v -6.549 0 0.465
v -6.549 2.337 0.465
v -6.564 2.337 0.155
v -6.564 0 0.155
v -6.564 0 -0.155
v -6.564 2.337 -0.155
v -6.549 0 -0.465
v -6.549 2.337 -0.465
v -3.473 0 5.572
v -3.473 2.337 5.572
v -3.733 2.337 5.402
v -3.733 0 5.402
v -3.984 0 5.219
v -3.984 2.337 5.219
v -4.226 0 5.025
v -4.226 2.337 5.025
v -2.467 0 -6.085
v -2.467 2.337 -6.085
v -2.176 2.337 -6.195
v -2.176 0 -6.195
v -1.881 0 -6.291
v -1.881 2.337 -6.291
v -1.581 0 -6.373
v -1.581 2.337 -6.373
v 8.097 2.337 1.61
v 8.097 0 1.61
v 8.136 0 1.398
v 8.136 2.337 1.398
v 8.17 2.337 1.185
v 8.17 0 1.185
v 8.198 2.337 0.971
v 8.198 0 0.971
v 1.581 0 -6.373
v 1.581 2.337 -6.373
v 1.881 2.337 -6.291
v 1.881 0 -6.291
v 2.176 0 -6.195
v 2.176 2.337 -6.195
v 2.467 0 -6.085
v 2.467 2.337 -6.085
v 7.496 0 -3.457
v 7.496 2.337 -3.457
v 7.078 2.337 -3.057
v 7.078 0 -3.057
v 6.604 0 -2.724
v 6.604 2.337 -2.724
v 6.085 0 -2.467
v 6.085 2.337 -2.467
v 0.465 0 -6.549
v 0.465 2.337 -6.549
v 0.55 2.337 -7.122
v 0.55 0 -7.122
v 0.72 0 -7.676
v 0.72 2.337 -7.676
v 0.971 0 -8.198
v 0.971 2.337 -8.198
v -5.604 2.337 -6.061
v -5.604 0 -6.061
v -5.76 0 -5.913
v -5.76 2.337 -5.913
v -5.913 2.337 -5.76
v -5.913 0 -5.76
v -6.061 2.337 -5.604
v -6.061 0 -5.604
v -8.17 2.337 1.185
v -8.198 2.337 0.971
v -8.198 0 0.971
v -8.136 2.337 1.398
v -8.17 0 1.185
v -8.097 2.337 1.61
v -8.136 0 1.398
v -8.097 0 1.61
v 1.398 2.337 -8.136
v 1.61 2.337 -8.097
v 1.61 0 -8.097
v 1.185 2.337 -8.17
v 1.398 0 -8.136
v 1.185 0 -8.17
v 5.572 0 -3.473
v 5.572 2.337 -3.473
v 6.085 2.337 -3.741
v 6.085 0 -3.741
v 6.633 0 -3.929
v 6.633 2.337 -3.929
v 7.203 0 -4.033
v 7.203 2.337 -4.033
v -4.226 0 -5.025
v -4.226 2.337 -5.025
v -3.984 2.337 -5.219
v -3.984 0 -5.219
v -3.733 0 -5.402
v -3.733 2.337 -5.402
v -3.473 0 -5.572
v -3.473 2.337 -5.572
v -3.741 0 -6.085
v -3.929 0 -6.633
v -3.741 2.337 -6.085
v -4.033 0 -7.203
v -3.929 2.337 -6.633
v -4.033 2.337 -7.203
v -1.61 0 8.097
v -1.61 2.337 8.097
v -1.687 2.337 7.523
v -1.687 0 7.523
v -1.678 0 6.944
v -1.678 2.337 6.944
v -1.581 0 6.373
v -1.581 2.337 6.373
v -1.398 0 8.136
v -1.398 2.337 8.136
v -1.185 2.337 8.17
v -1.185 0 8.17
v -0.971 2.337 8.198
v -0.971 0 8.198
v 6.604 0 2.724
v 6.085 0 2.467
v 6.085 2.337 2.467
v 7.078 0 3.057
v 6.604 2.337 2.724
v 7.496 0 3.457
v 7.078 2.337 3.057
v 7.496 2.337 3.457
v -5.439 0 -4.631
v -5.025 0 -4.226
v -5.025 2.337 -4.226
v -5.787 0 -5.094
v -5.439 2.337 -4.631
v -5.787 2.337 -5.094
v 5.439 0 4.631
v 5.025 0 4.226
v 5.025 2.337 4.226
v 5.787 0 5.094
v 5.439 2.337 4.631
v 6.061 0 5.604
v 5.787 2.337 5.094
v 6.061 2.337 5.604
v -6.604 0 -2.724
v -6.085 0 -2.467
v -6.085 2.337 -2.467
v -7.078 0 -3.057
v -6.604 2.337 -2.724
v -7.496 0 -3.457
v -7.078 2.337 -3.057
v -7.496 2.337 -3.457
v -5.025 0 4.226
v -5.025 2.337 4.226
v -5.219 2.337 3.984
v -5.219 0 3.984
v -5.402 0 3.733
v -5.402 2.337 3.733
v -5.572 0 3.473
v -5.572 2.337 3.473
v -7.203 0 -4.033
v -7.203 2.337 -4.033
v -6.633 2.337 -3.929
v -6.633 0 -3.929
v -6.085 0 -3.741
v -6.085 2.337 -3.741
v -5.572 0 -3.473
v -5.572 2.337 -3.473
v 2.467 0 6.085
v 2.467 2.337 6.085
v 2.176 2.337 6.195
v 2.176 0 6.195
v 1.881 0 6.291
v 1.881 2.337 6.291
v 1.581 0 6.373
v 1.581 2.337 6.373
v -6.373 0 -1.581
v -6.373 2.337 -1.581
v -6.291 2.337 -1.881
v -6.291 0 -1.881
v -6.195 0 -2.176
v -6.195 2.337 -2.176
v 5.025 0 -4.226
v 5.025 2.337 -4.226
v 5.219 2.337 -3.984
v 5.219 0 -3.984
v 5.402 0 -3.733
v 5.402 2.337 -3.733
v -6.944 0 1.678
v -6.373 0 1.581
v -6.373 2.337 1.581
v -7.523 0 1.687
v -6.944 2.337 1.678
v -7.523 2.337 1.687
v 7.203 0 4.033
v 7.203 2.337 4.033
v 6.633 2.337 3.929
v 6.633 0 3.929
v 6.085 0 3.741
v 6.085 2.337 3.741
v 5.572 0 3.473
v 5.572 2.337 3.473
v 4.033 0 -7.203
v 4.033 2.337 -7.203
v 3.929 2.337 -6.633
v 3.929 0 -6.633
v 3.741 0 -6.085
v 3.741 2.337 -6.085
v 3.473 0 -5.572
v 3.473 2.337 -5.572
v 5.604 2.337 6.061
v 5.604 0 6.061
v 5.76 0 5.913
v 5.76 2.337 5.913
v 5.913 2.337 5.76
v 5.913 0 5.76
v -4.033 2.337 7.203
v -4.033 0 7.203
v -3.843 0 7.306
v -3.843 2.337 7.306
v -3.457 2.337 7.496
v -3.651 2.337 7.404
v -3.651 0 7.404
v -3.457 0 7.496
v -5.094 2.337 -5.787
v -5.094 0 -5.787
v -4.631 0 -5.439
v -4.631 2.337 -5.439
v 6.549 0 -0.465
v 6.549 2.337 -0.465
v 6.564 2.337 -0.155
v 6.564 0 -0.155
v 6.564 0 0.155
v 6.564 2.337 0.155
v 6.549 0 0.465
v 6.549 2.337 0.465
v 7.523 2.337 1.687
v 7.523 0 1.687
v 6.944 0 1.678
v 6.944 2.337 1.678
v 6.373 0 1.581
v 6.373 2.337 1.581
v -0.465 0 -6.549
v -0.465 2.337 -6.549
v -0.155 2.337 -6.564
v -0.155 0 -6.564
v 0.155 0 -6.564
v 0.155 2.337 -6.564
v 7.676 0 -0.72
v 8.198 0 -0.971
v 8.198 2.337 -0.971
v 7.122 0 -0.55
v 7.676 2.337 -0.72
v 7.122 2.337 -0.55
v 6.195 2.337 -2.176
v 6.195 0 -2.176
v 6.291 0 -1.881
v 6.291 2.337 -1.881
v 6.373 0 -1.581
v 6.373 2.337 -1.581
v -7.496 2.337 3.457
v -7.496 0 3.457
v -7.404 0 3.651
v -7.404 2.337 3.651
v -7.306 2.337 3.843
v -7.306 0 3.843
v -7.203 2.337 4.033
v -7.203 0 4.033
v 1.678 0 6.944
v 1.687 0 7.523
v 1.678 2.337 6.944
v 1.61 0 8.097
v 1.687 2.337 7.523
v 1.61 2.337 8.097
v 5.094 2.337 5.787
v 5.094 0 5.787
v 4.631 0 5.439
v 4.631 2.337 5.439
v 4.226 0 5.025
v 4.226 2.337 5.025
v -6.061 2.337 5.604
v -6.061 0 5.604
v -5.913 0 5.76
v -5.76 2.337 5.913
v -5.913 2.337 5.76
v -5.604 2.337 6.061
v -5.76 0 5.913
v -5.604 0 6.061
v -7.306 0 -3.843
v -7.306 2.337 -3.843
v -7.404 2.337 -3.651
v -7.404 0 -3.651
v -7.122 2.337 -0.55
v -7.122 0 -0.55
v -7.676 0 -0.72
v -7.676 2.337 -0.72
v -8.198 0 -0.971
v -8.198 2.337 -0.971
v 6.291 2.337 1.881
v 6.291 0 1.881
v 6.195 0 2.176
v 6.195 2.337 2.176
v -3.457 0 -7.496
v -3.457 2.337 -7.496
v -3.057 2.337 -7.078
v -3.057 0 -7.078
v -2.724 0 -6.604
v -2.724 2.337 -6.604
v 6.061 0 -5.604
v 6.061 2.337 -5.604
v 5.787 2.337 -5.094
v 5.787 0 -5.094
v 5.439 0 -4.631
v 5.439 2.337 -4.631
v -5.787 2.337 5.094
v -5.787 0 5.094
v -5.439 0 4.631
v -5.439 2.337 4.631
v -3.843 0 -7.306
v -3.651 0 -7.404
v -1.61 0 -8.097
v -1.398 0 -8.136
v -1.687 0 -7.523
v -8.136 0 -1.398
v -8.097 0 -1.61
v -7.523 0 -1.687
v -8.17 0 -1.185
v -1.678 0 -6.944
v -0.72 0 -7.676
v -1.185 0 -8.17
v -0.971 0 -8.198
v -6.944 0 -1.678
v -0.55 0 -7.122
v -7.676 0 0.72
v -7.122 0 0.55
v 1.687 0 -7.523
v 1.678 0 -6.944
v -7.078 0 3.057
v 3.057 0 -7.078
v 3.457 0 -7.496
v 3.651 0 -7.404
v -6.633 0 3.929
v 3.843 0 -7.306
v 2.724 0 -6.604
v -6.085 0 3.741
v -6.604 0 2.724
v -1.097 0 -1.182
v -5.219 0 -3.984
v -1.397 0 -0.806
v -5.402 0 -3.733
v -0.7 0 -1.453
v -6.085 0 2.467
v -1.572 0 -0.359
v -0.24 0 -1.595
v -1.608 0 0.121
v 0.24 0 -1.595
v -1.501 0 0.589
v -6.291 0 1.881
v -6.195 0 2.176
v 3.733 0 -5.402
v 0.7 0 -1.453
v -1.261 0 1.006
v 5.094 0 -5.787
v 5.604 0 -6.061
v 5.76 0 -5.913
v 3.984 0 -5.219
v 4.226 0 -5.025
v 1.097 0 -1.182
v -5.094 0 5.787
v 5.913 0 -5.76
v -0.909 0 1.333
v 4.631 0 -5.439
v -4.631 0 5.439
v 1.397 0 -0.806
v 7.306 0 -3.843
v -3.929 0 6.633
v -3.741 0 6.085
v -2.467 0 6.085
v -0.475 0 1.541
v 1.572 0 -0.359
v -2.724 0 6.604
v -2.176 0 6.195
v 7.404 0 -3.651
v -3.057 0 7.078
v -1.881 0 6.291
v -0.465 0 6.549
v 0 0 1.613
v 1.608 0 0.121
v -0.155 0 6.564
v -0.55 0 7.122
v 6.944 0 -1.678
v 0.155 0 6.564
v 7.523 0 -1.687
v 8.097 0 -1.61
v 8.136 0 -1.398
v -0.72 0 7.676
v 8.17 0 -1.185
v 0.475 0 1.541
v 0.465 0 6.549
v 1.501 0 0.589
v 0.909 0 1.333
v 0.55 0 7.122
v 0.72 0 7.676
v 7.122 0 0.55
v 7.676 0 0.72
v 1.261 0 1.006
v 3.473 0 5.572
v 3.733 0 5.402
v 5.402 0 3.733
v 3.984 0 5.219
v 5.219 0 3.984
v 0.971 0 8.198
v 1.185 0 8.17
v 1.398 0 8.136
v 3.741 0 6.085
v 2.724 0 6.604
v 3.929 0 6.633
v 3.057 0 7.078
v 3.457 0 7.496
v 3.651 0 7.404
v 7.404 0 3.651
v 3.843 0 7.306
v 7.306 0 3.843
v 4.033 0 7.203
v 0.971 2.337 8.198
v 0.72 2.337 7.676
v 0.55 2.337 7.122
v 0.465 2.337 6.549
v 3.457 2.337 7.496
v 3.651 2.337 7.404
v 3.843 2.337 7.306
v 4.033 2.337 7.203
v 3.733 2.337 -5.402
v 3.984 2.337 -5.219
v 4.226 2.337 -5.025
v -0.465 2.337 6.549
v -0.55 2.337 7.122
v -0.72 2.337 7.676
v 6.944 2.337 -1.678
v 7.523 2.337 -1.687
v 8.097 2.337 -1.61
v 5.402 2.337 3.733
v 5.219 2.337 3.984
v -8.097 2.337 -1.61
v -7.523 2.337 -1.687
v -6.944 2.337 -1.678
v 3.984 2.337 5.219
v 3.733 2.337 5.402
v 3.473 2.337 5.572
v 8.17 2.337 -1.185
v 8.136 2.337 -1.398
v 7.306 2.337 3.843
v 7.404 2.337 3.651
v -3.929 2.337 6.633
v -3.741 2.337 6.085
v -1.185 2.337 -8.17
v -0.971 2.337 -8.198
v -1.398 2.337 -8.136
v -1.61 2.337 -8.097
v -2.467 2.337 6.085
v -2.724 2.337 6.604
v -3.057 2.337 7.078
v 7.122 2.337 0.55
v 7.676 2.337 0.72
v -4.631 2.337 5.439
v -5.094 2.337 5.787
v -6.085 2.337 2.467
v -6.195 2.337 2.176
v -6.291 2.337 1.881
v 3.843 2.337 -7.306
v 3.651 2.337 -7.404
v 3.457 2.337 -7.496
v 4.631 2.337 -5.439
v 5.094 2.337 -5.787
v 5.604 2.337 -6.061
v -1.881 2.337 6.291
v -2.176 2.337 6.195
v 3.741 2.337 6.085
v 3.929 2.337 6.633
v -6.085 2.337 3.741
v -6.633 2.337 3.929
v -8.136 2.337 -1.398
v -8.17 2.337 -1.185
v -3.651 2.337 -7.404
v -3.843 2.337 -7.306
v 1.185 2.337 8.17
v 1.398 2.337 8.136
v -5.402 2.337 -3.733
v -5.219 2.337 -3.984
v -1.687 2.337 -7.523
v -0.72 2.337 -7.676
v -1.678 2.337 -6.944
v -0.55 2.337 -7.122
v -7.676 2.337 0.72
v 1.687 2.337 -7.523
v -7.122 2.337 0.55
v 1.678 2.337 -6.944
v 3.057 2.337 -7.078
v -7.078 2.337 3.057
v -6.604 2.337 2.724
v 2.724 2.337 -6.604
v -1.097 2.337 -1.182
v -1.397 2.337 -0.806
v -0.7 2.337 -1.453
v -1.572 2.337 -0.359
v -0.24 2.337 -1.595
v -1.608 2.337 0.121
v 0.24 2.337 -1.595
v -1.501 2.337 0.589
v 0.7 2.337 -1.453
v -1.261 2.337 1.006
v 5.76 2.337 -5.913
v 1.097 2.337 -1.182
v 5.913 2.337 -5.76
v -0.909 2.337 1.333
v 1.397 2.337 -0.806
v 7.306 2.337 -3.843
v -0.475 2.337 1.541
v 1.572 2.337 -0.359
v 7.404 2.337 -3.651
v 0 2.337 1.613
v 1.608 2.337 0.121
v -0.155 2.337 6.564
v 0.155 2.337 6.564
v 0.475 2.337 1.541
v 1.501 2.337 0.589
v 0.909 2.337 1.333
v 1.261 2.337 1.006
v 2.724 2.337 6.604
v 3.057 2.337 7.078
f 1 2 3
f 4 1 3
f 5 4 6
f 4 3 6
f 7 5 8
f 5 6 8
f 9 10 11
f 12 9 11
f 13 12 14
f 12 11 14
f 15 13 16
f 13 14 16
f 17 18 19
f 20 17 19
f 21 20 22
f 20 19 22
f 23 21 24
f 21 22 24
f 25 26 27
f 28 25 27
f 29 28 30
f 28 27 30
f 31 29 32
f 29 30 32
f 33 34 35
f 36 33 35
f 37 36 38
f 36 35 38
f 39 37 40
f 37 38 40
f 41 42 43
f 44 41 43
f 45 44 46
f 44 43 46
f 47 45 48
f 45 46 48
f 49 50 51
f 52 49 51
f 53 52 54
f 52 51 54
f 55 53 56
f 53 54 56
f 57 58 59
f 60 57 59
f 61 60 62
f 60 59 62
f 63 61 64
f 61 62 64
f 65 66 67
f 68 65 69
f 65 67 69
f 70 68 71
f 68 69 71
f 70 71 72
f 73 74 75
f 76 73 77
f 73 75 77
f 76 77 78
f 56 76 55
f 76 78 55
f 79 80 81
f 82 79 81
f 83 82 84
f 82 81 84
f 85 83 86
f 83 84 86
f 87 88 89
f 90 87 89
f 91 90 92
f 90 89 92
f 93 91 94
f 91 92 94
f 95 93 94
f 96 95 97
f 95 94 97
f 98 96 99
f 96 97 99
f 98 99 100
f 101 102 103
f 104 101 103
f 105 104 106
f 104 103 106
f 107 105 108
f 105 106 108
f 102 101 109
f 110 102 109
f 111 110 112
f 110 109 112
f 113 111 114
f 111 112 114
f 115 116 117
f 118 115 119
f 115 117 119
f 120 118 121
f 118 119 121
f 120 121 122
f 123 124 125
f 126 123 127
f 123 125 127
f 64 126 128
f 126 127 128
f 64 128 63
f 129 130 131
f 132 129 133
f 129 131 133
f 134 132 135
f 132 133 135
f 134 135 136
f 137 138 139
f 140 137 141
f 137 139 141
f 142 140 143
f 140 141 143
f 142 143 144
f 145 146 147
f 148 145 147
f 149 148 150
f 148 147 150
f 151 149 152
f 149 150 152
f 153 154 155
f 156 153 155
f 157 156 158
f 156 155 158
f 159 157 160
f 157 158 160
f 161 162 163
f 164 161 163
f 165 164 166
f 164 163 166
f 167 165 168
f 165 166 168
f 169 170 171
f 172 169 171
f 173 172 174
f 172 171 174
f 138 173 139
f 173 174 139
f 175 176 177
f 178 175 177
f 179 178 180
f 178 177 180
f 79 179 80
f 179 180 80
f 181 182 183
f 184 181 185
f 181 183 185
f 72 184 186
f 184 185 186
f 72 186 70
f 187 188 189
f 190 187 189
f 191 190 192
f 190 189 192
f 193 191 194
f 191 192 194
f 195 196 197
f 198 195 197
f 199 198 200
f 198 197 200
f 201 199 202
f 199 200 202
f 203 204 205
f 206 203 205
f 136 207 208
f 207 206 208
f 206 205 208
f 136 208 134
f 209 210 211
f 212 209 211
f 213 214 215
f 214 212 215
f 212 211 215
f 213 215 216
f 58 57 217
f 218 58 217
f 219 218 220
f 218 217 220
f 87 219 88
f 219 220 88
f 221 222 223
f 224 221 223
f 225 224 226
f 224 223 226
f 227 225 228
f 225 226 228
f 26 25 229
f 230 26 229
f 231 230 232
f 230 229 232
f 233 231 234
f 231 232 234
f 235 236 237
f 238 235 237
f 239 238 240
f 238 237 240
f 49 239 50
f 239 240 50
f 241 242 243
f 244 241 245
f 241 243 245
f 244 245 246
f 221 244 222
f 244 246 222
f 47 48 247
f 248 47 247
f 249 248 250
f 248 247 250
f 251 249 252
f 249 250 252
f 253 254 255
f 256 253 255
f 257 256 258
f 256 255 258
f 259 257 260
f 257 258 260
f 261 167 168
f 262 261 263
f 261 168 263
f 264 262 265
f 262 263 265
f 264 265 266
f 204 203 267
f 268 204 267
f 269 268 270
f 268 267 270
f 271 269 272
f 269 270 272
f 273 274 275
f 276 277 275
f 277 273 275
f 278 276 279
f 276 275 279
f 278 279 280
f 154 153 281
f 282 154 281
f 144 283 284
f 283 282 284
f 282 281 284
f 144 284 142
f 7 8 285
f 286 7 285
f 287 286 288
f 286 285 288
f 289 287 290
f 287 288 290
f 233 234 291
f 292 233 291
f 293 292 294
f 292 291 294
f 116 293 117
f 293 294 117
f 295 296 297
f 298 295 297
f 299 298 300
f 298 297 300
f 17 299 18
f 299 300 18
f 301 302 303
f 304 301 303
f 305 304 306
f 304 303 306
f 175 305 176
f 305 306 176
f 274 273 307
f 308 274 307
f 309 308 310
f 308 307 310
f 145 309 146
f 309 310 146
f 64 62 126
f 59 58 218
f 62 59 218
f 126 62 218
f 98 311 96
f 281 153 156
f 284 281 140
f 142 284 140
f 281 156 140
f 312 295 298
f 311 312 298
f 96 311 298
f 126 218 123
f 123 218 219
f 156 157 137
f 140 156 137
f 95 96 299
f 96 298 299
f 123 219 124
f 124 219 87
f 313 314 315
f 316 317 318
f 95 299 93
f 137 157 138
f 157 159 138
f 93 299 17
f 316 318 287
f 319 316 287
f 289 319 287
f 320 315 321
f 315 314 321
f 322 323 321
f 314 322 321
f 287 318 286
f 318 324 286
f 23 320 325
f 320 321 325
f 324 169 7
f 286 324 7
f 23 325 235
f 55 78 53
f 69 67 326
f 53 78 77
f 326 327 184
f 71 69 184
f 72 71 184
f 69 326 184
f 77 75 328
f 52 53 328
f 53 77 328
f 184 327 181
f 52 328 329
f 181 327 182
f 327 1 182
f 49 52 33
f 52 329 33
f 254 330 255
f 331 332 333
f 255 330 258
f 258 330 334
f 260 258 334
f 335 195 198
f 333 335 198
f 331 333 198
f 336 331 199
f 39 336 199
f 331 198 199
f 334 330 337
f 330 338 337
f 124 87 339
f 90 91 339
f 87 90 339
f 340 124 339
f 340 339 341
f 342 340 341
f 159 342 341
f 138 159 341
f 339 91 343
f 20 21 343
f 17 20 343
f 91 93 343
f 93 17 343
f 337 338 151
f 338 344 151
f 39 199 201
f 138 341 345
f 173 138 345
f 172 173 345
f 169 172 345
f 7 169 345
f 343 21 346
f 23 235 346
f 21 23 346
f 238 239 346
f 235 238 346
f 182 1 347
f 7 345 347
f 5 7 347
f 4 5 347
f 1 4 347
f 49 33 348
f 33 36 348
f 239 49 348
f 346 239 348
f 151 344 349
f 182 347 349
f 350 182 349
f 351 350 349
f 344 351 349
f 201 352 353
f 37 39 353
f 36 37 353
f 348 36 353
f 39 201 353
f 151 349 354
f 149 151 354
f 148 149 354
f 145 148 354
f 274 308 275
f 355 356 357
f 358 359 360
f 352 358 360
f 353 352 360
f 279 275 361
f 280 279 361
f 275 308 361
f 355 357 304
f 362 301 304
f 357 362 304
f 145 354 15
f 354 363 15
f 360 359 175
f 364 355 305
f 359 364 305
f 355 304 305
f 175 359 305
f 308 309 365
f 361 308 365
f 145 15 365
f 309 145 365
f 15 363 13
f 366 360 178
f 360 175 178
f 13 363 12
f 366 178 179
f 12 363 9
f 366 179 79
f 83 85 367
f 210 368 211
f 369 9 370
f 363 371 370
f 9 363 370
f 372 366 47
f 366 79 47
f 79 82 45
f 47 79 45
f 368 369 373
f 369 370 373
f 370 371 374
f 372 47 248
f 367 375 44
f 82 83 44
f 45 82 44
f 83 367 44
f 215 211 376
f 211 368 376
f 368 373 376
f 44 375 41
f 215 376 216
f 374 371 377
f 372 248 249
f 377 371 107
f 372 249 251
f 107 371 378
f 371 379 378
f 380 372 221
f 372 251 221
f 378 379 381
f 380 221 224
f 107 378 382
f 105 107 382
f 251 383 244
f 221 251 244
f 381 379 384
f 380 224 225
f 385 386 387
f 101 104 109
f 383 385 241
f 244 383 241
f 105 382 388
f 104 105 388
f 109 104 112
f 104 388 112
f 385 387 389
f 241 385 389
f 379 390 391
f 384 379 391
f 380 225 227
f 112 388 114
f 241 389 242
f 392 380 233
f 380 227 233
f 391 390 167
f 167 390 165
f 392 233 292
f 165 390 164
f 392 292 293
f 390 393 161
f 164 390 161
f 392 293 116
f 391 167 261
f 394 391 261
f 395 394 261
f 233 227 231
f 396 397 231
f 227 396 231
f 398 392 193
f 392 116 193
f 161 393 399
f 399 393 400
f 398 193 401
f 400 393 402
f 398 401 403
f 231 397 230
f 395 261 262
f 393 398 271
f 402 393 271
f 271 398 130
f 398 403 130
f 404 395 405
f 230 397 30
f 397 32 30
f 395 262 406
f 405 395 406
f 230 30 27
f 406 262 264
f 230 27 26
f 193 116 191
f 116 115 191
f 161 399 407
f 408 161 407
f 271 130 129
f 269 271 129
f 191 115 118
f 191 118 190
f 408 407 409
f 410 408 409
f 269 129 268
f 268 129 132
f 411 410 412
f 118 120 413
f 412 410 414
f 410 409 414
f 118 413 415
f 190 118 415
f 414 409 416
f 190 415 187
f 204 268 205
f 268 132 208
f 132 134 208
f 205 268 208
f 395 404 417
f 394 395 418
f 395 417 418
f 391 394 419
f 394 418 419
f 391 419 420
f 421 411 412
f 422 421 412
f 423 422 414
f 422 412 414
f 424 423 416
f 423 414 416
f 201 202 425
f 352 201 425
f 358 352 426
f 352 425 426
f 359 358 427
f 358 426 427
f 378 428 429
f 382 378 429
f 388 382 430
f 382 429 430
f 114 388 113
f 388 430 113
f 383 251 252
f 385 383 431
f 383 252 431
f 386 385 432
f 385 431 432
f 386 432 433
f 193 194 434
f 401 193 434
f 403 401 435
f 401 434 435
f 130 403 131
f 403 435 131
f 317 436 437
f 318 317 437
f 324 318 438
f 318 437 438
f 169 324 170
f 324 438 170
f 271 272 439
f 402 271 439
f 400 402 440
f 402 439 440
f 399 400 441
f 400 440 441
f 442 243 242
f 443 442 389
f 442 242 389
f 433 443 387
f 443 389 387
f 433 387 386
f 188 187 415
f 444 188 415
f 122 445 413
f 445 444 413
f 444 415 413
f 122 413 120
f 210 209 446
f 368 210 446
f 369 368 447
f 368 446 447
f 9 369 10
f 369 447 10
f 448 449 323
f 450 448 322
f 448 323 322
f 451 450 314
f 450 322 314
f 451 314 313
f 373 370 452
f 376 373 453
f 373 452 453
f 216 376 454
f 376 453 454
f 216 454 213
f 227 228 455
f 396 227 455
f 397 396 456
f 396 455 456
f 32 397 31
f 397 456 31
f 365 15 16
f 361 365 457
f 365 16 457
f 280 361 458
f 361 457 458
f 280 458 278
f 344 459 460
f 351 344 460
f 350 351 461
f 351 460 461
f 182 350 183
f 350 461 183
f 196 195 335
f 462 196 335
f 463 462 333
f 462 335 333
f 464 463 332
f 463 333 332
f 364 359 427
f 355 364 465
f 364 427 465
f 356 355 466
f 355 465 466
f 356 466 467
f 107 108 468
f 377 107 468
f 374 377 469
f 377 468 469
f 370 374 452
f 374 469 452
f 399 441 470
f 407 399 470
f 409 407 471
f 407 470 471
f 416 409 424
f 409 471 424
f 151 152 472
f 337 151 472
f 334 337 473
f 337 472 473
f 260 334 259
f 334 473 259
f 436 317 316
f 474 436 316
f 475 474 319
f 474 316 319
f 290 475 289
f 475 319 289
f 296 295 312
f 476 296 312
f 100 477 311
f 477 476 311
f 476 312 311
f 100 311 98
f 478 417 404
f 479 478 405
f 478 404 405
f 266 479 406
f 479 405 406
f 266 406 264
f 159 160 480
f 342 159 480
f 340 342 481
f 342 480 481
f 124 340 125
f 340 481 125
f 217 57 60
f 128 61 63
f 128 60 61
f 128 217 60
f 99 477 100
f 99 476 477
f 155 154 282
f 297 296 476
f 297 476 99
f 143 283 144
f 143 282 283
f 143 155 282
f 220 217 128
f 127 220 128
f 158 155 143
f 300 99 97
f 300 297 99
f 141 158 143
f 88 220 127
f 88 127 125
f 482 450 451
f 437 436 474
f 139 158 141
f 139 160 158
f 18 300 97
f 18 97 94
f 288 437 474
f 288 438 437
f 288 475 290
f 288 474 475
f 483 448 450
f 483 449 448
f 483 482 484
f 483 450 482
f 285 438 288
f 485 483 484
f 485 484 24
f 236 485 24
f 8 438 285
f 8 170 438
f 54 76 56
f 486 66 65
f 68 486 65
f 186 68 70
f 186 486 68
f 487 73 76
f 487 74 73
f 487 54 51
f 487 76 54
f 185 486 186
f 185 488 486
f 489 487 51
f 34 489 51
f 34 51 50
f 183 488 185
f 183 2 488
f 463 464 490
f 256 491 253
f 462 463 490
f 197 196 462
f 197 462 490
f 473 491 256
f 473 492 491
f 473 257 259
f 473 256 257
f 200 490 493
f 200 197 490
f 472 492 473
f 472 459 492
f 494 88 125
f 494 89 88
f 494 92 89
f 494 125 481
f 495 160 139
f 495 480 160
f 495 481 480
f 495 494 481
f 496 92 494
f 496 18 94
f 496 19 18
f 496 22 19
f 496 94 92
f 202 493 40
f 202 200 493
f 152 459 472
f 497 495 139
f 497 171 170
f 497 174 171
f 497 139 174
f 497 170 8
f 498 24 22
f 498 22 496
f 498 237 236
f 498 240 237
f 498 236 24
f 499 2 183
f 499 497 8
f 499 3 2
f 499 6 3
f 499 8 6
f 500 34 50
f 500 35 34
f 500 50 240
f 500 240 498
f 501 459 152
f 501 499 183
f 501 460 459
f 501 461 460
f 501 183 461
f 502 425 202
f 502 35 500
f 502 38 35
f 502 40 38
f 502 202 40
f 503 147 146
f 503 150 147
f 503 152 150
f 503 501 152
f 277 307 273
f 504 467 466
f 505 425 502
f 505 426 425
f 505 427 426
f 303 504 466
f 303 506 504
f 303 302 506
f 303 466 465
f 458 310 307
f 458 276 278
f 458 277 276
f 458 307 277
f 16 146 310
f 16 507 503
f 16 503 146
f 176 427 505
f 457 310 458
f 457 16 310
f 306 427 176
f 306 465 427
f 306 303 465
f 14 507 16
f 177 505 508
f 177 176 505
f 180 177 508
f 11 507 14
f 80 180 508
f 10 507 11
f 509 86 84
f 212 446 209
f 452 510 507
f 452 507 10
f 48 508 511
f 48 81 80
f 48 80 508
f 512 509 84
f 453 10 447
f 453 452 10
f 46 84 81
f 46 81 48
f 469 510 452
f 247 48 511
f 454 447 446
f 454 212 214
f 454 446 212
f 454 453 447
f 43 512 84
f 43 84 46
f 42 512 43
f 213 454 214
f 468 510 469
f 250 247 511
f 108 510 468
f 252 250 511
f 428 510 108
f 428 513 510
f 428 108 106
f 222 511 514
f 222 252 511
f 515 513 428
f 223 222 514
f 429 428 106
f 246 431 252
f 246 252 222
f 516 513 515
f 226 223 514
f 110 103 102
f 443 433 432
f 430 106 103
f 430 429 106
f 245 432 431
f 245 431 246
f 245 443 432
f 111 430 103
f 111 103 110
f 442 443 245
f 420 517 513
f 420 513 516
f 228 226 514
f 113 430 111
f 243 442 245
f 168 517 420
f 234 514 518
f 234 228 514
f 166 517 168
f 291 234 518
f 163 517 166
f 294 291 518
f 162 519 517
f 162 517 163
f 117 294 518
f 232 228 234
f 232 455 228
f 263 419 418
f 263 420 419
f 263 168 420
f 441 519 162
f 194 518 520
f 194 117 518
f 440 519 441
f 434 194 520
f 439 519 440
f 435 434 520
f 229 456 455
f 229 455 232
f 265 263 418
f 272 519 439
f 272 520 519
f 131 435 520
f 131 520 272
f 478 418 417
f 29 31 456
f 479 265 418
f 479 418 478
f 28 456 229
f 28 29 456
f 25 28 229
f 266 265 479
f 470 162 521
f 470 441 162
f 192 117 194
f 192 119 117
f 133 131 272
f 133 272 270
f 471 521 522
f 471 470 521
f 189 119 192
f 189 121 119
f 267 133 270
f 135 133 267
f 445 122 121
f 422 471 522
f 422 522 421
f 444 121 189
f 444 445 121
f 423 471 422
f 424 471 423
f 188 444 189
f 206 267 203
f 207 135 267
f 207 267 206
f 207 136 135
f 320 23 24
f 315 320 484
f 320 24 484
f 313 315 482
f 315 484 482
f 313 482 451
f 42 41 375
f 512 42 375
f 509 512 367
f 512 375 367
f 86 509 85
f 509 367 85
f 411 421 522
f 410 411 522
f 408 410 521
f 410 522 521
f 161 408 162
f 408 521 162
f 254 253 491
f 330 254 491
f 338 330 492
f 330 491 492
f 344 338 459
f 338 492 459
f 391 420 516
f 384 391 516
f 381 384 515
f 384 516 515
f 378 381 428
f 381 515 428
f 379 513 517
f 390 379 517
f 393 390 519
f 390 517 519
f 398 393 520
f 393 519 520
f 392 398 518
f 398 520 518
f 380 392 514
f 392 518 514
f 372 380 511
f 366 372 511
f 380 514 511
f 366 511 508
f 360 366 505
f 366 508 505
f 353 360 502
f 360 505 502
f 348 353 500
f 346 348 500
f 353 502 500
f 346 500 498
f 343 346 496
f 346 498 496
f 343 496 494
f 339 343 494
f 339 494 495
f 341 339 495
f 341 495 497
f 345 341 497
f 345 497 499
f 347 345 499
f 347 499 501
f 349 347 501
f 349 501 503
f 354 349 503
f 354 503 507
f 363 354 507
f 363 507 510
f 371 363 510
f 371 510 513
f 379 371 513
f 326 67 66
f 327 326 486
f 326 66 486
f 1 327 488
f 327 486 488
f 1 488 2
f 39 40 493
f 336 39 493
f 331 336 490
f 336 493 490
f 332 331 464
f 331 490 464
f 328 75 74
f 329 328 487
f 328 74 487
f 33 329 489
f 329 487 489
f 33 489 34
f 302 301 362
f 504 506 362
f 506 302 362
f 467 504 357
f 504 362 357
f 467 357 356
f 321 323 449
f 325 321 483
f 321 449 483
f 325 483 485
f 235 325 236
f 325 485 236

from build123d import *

# Parameters (mm, degrees)
SKETCH1_R           = 8.255
BOSS_EXTRUDE1_DEPTH = 2.3368
SKETCH2_R           = 1.6129
CUT_EXTRUDE1_DEPTH  = 12.905909635
CUT_EXTRUDE6_DEPTH  = 12.905909635
CIRPATTERN1_COUNT   = 20


with BuildPart() as part:
    # Sketch1 → Boss-Extrude1 (new body)
    with BuildSketch(Plane(origin=(0, 0, 0), x_dir=(1, 0, 0), z_dir=(0, 1, 0))):
        with Locations(Location((0, 0, 0), (0, 0, 270))):
            Circle(SKETCH1_R)
    extrude(amount=BOSS_EXTRUDE1_DEPTH)

    # Sketch2 → Cut-Extrude1 (cut, through all)
    with BuildSketch(Plane(origin=(0, 2.3368, 0), x_dir=(1, 0, 0), z_dir=(0, 1, 0))):
        with Locations(Location((0, 0, 0), (0, 0, 270))):
            Circle(SKETCH2_R)
    extrude(amount=-CUT_EXTRUDE1_DEPTH, mode=Mode.SUBTRACT)

    # Sketch3 → Cut-Extrude6 (cut, through all)
    with BuildSketch(Plane(origin=(0, 2.3368, 0), x_dir=(1, 0, 0), z_dir=(0, 1, 0))):
        with BuildLine():
            Line((1.426333388, 8.827371755), (-1.426333388, 8.827371755))
            ThreePointArc((-1.426333388, 8.827371755), (-0.757299678, 7.767926416), (-0.465480831, 6.549373056))
            ThreePointArc((-0.465480831, 6.549373056), (0, 6.565893681), (0.465480831, 6.549373056))
            ThreePointArc((0.465480831, 6.549373056), (0.757299678, 7.767926416), (1.426333388, 8.827371755))
        make_face()
    cut_extrude6 = extrude(amount=-CUT_EXTRUDE6_DEPTH, mode=Mode.SUBTRACT)

    # CirPattern1: Cut-Extrude6 ×20 about axis
    cirpattern1_axis = Axis((0, 0, 0), (0, 1, 0))
    for i in range(1, CIRPATTERN1_COUNT):
        add(cut_extrude6.rotate(cirpattern1_axis, i * 360 / CIRPATTERN1_COUNT), mode=Mode.SUBTRACT)


solid = part.part
